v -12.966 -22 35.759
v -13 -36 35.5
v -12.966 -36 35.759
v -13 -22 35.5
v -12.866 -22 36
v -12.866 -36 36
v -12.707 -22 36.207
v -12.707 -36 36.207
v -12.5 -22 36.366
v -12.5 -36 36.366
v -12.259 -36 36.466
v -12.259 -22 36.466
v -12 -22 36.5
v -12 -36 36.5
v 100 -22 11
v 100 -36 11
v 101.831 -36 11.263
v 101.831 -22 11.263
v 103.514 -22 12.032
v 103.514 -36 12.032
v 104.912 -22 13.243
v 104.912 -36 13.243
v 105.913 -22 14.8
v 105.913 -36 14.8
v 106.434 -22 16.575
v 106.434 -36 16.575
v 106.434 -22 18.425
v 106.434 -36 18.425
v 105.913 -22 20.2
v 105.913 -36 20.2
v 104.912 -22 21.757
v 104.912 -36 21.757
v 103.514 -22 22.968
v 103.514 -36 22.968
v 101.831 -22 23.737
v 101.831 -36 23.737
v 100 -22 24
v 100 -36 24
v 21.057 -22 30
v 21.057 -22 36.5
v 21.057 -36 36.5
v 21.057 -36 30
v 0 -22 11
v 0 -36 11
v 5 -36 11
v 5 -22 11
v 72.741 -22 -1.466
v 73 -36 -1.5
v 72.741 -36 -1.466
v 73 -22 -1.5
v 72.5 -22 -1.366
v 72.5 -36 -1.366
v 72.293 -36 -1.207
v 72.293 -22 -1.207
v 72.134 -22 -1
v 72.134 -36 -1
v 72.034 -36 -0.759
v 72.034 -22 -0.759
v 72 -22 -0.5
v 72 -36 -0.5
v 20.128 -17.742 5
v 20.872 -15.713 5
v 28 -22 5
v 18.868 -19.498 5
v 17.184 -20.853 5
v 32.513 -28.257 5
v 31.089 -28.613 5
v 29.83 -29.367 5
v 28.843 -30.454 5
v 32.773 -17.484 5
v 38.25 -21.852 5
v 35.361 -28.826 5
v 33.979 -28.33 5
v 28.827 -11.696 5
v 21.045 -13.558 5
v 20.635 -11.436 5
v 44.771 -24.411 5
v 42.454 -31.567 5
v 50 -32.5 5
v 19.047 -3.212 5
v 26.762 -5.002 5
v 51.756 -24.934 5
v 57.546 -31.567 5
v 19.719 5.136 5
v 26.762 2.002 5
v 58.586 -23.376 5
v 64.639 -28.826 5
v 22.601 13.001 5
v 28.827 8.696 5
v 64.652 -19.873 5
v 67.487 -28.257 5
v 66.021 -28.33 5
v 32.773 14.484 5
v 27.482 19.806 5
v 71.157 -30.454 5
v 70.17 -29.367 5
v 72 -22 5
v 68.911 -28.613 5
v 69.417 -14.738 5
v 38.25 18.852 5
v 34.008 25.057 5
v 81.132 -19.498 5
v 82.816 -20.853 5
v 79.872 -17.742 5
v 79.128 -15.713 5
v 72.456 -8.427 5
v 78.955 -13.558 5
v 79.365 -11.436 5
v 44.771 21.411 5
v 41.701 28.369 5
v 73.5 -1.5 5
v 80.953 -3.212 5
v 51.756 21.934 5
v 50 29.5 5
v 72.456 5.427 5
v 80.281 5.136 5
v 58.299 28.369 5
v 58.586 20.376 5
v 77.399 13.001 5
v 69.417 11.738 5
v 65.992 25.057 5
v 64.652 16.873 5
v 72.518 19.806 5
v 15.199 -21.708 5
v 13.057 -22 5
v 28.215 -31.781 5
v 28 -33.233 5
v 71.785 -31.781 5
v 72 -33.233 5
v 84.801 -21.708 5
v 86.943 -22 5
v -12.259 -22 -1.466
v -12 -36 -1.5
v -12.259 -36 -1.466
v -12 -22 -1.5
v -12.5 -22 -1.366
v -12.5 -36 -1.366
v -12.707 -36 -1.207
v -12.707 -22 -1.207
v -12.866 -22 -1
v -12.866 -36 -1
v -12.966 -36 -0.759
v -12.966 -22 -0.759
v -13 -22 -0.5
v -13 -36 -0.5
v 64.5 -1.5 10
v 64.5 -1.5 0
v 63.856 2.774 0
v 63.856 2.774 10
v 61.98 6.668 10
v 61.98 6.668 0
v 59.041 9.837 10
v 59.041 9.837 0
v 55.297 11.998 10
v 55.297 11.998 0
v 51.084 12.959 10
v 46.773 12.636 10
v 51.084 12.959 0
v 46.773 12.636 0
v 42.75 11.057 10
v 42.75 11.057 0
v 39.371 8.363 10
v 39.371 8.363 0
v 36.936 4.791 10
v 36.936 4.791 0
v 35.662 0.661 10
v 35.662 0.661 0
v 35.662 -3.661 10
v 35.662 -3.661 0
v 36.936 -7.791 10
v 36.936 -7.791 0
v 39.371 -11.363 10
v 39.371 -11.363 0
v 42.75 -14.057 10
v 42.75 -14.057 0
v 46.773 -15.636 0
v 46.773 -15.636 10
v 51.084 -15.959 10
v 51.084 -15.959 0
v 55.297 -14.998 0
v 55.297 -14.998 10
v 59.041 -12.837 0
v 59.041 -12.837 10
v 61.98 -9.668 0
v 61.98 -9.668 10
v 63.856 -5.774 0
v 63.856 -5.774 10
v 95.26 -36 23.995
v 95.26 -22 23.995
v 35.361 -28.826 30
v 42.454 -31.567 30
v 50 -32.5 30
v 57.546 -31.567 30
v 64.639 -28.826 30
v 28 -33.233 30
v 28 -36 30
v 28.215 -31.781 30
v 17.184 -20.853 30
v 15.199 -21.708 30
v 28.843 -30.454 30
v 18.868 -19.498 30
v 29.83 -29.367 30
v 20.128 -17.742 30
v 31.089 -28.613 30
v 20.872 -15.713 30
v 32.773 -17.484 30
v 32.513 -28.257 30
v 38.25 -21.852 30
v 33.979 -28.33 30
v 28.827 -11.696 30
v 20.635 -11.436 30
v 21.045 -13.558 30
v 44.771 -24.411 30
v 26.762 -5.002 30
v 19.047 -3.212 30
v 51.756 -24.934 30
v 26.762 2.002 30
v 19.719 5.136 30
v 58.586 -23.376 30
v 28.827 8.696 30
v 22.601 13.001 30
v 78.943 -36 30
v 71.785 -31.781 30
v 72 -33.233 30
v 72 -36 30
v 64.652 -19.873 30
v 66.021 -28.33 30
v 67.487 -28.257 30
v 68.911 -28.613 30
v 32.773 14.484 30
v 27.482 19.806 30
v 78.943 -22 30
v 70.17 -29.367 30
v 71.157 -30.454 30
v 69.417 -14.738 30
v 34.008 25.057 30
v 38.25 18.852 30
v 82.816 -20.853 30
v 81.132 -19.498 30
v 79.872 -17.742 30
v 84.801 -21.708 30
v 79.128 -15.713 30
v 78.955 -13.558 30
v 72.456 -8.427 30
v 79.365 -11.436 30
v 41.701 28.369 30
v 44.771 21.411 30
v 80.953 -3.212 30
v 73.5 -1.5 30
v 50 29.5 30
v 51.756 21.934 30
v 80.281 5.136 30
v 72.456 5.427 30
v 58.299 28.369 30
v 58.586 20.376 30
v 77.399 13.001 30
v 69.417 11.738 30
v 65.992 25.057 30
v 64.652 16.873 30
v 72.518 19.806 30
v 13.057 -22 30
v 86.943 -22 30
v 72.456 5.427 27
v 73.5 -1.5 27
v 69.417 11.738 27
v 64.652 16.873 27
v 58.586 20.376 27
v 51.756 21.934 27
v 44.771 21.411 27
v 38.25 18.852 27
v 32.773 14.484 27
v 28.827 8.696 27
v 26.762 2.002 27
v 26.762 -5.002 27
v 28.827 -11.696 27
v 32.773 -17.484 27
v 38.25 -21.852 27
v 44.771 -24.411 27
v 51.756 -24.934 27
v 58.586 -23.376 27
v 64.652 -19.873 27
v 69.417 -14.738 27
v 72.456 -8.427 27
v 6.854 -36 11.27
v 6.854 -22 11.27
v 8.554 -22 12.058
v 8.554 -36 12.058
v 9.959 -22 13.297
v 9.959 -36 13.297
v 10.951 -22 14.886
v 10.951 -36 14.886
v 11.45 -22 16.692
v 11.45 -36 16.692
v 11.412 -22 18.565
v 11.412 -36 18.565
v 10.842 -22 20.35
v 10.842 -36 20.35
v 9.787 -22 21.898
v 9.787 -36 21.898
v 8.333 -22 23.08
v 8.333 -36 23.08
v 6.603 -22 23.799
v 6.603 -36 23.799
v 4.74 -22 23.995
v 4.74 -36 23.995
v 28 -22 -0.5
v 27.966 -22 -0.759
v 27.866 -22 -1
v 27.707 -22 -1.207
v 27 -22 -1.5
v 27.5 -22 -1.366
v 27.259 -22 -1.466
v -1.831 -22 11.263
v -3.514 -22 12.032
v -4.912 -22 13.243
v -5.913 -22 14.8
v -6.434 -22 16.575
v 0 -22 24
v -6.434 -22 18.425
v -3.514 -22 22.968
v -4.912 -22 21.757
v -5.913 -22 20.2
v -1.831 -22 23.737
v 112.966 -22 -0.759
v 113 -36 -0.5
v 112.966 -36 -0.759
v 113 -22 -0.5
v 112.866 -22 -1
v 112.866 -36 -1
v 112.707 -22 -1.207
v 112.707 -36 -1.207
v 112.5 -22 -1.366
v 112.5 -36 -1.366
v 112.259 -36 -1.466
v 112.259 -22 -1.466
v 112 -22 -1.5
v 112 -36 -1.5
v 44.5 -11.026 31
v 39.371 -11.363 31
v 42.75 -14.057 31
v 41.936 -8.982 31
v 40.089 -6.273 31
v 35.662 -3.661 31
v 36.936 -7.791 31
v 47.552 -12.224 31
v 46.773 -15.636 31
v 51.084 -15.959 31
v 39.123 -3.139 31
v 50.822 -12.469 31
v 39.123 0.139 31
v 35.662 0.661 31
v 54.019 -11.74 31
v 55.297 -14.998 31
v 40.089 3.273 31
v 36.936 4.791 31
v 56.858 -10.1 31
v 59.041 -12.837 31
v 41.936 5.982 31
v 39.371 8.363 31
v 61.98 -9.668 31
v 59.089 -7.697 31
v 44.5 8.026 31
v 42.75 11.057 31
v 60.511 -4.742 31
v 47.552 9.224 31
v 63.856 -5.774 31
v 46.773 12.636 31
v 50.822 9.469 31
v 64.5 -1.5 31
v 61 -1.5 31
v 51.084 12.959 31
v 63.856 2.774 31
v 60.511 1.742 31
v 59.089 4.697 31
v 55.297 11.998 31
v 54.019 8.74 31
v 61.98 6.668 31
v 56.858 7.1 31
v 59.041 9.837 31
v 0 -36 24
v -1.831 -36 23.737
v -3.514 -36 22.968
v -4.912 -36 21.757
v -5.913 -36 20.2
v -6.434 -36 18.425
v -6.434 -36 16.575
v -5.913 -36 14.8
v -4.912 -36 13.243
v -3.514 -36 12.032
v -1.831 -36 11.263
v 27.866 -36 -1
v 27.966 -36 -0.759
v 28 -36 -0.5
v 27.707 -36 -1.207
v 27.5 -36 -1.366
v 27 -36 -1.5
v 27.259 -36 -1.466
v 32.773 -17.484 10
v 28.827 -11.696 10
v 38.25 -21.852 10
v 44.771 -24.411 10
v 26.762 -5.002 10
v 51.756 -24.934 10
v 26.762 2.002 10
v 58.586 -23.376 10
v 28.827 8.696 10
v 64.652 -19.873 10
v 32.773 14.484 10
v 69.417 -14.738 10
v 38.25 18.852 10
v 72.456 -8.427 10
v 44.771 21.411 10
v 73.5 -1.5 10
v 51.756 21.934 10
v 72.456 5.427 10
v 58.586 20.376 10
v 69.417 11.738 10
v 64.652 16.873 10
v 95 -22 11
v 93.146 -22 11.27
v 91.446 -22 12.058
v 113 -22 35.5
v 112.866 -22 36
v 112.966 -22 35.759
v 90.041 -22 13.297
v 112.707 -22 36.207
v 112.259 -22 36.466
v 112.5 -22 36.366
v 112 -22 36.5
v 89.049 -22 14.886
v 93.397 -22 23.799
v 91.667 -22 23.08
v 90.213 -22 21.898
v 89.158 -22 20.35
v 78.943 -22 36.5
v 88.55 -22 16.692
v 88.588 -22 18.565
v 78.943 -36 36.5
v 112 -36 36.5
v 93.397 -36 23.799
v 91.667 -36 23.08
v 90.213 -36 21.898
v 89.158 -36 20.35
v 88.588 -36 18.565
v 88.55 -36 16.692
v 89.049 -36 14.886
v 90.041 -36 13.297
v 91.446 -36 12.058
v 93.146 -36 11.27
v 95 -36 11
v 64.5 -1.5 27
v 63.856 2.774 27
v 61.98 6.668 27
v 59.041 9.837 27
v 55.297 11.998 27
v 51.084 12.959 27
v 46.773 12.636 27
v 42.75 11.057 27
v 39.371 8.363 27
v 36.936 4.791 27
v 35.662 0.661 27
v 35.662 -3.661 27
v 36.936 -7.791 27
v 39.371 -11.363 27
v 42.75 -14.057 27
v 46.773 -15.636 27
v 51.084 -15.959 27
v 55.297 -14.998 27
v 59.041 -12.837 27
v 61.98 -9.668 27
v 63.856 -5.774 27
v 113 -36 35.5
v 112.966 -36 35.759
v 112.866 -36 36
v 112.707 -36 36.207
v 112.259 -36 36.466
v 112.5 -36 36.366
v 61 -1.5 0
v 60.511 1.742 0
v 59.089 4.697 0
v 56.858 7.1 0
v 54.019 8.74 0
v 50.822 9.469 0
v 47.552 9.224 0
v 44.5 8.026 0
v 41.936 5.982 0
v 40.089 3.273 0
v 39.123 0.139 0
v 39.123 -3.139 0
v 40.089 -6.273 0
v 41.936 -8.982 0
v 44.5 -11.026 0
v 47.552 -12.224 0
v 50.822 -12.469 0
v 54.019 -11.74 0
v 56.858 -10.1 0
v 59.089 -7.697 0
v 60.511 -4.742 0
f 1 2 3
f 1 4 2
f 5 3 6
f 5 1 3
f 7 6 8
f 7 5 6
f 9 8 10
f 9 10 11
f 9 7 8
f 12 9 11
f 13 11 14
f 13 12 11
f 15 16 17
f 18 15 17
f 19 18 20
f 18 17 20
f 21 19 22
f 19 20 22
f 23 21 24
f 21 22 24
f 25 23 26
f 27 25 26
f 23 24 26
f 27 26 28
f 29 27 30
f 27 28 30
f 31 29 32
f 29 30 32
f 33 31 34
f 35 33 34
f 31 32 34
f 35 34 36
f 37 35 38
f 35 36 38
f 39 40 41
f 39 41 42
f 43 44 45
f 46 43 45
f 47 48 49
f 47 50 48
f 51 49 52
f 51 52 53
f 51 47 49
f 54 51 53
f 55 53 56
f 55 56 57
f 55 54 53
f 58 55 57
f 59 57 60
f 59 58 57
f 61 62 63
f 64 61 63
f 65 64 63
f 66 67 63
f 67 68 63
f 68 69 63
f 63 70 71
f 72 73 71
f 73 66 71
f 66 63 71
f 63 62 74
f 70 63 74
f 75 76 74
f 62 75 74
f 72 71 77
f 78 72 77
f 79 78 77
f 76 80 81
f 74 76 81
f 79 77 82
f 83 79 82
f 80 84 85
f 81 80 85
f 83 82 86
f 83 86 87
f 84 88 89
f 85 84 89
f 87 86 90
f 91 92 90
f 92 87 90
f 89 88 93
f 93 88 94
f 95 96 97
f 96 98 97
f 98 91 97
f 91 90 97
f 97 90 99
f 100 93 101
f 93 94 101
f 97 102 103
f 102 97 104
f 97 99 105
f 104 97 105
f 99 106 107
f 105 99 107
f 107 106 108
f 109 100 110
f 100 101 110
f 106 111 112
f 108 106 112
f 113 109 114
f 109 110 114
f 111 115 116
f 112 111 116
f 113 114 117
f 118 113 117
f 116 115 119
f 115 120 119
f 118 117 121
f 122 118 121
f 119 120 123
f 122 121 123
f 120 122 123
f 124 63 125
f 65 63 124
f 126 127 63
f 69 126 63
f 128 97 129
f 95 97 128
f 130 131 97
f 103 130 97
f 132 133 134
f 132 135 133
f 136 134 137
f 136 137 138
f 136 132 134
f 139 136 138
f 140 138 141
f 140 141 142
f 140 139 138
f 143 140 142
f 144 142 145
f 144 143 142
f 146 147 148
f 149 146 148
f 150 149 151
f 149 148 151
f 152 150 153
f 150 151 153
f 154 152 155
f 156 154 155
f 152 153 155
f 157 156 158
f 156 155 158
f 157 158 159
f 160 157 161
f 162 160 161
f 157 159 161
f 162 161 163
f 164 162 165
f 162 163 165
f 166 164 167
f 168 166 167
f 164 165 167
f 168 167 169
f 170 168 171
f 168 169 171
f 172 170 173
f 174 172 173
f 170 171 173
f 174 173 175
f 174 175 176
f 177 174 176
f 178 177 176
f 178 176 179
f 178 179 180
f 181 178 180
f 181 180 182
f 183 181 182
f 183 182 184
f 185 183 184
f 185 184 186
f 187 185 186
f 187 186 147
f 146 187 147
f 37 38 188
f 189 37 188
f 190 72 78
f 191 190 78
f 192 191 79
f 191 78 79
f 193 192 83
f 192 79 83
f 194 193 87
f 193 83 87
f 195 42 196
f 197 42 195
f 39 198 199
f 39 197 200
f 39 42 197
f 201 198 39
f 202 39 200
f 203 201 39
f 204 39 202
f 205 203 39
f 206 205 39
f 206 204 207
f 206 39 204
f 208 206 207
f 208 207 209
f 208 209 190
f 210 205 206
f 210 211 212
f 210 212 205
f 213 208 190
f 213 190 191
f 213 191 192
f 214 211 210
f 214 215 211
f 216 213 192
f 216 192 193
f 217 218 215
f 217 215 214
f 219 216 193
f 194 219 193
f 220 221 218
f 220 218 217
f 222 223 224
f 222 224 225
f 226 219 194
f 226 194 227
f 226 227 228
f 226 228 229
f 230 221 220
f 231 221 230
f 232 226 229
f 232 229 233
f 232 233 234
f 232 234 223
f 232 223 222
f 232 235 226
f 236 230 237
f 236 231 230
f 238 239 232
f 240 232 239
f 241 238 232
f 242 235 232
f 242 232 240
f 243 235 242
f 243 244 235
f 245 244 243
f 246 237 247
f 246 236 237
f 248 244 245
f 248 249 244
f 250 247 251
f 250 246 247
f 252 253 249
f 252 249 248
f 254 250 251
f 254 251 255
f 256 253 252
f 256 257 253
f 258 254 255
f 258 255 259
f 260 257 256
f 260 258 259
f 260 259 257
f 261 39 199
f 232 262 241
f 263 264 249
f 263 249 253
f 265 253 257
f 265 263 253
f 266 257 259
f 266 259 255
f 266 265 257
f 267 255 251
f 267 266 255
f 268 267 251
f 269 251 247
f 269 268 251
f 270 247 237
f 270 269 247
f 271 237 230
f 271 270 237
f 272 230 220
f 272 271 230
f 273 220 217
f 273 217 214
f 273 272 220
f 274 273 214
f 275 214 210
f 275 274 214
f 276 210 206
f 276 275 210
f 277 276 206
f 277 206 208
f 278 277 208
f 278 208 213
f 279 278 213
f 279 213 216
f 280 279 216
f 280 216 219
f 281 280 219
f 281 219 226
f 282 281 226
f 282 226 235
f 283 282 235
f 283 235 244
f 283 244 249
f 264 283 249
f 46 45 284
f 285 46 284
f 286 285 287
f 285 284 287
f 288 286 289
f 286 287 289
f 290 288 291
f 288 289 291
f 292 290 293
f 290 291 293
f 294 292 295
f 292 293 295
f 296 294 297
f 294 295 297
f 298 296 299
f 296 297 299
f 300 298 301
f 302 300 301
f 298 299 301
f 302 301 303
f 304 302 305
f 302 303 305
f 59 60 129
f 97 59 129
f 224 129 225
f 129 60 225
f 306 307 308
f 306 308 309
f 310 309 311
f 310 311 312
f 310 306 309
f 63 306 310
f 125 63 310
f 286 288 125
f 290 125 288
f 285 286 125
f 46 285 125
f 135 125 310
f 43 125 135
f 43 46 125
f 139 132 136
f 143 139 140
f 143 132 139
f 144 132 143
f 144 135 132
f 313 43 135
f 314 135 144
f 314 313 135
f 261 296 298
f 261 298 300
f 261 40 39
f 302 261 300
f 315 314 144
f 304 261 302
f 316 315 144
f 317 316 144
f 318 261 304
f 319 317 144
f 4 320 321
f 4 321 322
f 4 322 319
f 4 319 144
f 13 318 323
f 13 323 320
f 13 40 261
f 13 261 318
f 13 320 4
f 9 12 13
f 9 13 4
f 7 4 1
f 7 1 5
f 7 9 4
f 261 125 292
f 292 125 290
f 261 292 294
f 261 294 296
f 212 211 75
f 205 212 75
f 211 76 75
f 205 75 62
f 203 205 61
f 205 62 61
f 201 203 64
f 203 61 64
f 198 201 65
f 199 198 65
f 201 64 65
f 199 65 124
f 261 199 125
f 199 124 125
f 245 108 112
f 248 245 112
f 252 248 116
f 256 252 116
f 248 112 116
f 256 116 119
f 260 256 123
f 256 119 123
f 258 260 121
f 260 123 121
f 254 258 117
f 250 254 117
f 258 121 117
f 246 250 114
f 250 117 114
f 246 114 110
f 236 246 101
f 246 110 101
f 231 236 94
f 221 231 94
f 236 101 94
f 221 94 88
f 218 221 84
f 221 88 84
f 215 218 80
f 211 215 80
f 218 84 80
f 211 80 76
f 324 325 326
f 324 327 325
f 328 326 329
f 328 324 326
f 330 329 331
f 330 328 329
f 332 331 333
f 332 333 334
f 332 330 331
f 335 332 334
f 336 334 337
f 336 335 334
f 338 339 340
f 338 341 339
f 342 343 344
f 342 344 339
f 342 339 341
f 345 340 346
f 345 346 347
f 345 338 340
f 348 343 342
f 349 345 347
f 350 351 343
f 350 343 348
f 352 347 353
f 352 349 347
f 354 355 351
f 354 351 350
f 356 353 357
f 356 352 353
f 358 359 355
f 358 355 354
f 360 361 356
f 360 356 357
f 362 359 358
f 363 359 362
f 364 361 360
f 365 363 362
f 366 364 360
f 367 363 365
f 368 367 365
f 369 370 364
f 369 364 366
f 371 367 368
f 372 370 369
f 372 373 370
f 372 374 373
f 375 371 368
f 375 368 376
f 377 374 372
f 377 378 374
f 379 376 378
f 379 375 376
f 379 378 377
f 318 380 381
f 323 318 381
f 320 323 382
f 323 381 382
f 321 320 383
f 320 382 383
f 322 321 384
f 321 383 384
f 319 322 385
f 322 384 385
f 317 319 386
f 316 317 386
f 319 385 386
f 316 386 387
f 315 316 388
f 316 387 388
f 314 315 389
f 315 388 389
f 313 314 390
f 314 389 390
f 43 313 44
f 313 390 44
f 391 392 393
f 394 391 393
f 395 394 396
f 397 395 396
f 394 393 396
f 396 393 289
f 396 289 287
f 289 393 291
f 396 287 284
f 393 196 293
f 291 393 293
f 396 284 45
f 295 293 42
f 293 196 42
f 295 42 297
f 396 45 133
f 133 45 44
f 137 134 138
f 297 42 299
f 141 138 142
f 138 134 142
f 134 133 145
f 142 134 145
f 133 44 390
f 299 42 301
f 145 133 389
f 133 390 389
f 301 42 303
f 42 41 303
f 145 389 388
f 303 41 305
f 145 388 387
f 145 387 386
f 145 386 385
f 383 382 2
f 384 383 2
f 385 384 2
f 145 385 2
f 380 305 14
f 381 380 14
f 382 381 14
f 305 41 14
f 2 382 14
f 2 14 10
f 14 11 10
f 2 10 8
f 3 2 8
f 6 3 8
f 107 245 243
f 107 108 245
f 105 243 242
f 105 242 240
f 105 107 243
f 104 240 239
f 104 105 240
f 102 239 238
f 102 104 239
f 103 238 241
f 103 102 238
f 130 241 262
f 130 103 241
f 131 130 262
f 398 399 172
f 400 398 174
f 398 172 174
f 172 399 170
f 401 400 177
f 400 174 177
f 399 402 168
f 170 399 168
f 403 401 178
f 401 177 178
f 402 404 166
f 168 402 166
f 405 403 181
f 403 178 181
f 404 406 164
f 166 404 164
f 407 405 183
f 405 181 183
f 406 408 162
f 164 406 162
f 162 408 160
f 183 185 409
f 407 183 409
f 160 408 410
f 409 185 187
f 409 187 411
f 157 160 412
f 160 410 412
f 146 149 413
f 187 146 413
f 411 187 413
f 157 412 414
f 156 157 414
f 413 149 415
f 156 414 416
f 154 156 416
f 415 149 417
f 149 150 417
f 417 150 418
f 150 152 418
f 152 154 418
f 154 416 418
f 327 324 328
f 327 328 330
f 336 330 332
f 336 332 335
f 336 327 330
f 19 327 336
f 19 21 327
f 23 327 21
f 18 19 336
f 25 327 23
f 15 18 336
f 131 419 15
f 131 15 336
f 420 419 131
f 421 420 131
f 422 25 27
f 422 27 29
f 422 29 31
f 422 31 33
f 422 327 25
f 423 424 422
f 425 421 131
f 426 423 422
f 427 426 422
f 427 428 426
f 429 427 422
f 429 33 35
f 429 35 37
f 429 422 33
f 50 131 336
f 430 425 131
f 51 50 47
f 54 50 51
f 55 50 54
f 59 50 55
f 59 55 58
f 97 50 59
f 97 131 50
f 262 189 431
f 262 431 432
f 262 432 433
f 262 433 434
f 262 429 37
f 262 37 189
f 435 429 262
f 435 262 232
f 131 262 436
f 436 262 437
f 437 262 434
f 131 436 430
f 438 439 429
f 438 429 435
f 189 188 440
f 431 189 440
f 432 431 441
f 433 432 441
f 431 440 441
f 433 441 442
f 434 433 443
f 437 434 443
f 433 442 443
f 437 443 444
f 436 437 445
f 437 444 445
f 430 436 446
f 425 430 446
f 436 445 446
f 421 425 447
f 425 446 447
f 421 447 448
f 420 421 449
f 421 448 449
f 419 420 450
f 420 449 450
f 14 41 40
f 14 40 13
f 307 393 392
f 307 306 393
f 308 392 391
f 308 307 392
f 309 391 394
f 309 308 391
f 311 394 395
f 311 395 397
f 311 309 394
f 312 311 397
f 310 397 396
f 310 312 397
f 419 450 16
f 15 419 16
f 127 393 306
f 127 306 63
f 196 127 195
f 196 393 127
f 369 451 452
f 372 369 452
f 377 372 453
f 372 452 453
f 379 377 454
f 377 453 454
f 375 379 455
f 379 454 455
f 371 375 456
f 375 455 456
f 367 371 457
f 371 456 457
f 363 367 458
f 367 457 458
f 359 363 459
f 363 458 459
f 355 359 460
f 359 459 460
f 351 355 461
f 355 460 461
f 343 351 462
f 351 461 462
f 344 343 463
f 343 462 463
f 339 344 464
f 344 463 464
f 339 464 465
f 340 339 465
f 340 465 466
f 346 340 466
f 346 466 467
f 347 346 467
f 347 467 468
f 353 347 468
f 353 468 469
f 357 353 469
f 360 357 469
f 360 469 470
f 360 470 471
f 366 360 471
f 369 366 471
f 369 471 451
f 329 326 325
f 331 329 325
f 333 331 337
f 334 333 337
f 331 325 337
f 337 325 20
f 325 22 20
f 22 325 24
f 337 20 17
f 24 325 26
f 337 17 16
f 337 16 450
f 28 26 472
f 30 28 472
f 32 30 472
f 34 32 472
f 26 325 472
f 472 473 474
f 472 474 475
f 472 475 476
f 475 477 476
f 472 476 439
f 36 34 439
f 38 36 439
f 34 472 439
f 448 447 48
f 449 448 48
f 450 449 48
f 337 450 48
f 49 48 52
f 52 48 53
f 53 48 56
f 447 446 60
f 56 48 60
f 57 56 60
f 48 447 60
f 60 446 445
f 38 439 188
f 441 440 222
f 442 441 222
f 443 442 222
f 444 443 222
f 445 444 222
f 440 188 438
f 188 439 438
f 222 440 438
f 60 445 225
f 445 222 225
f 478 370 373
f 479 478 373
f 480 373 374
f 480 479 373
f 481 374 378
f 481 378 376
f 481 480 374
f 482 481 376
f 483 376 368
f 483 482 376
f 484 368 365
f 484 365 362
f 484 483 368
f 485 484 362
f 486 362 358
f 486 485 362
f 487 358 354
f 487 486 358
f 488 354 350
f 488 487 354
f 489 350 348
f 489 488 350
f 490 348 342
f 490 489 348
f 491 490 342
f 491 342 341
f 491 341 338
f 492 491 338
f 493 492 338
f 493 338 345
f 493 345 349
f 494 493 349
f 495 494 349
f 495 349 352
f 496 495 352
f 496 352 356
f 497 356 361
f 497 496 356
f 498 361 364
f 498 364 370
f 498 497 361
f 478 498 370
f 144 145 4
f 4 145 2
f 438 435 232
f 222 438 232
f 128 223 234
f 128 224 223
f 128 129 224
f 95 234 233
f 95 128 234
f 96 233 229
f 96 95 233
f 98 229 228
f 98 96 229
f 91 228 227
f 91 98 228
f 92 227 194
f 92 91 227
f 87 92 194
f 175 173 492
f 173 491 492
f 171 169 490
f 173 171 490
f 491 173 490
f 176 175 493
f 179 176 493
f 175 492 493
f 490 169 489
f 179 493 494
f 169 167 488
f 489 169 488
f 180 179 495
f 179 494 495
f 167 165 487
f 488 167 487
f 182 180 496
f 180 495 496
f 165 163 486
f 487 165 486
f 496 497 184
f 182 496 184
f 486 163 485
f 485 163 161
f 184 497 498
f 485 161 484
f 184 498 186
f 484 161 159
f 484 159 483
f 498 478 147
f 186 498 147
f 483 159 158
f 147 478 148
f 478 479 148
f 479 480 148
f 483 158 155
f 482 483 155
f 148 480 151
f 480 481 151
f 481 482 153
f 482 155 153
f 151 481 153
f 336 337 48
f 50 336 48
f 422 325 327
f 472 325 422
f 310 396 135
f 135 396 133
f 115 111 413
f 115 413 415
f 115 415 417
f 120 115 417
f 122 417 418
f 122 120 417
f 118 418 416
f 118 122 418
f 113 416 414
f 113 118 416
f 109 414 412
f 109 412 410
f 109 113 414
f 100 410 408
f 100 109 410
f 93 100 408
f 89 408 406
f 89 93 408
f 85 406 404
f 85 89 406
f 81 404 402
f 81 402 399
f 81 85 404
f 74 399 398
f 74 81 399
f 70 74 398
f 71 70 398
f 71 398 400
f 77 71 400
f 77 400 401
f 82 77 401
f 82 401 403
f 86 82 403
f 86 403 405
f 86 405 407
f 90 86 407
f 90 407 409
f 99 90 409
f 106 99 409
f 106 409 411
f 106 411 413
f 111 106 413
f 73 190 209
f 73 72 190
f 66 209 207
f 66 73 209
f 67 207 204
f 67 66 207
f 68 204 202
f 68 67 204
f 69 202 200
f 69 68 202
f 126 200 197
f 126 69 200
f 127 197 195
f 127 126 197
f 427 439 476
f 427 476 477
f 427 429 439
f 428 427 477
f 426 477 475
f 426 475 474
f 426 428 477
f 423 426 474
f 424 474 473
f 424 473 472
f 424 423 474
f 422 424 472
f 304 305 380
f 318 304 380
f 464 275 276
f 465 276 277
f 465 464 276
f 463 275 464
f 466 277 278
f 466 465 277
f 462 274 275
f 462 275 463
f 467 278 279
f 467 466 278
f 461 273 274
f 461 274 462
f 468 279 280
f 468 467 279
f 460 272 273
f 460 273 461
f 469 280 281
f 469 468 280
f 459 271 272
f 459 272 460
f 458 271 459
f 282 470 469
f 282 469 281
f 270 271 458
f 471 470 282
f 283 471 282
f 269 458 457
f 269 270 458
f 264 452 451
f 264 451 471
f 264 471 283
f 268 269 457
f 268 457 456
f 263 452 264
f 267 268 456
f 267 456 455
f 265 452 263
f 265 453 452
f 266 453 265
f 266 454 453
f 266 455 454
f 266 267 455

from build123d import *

# Parameters (mm, degrees)
SKETCH_8_R          = 14.5
SKETCH_8_R_2        = 11
EXTRUDE_1_DEPTH     = 31
SKETCH_10_R         = 23.5
SKETCH_10_R_2       = 14.5
EXTRUDE_2_DEPTH     = 17
EXTRUDE_START       = -5
SKETCH_11_R         = 31
SKETCH_11_R_2       = 23.5
EXTRUDE_3_DEPTH     = 25
SKETCH_13_W         = 41
SKETCH_13_H         = 38
EXTRUDE_4_DEPTH     = 14
FILLET_1_R          = 8
FILLET_2_R          = 5
FILLET_3_R          = 5
FILLET_4_R          = 8
FILLET_5_R          = 1
FILLET_6_R          = 1
SKETCH_14_W         = 12.689774382
SKETCH_14_H         = 9.496761799
CUT_EXTRUDE_5_DEPTH = 130.435312029


with BuildPart() as part:
    # Эскиз8 → Вытянуть1 (new body)
    with BuildSketch(Plane.XY):
        with Locations((50, -1.5)):
            Circle(SKETCH_8_R)
        with Locations((50, -1.5)):
            Circle(SKETCH_8_R_2, mode=Mode.SUBTRACT)
    extrude(amount=EXTRUDE_1_DEPTH)

    # Эскиз10 → Вытянуть2 (add)
    with BuildSketch(Plane.XY.offset(10)):
        with Locations((50, -1.5)):
            Circle(SKETCH_10_R)
        with Locations((50, -1.5)):
            Circle(SKETCH_10_R_2, mode=Mode.SUBTRACT)
    extrude(amount=EXTRUDE_2_DEPTH)

    # Эскиз11 → Вытянуть3 (add)
    with BuildSketch(Plane.XY.offset(10).offset(EXTRUDE_START)):
        with Locations((50, -1.5)):
            Circle(SKETCH_11_R)
        with Locations((50, -1.5)):
            Circle(SKETCH_11_R_2, mode=Mode.SUBTRACT)
    extrude(amount=EXTRUDE_3_DEPTH)

    # Эскиз13 → Вытянуть4 (add)
    # profile 1 of 2: a face of its own
    with BuildSketch(Plane(origin=(0, -36, 0), x_dir=(-1, 0, 0), z_dir=(0, 1, 0))):
        with Locations((-7.5, 17.5)):
            Rectangle(SKETCH_13_W, SKETCH_13_H)
        with BuildLine():
            Line((-4.740103958, 23.994802079), (0, 24))
            ThreePointArc((0, 24), (6.5, 17.5), (0, 11))
            Line((0, 11), (-5, 11))
            ThreePointArc((-5, 11), (-11.49870039, 17.629974008), (-4.740103958, 23.994802079))
        make_face(mode=Mode.SUBTRACT)
    # profile 2 of 2: a face of its own
    with BuildSketch(Plane(origin=(0, -36, 0), x_dir=(-1, 0, 0), z_dir=(0, 1, 0))):
        with Locations((-92.5, 17.5)):
            Rectangle(SKETCH_13_W, SKETCH_13_H)
        with BuildLine():
            Line((-95, 11), (-100, 11))
            ThreePointArc((-100, 11), (-106.5, 17.5), (-100, 24))
            Line((-100, 24), (-95.259896042, 23.994802079))
            ThreePointArc((-95.259896042, 23.994802079), (-88.50129961, 17.629974008), (-95, 11))
        make_face(mode=Mode.SUBTRACT)
    extrude(amount=EXTRUDE_4_DEPTH)

    # Скругление1
    fillet_1_edges = [part.edges().sort_by_distance(p)[0] for p in [
        (26.745968092, -22, 17.5),
    ]]
    fillet(fillet_1_edges, radius=FILLET_1_R)

    # Скругление2
    fillet_2_edges = [part.edges().sort_by_distance(p)[0] for p in [
        (28, -23.340329668, 17.5),
    ]]
    fillet(fillet_2_edges, radius=FILLET_2_R)

    # Скругление3
    fillet_3_edges = [part.edges().sort_by_distance(p)[0] for p in [
        (72, -23.340329668, 17.5),
    ]]
    fillet(fillet_3_edges, radius=FILLET_3_R)

    # Скругление4
    fillet_4_edges = [part.edges().sort_by_distance(p)[0] for p in [
        (73.254031908, -22, 17.5),
    ]]
    fillet(fillet_4_edges, radius=FILLET_4_R)

    # Скругление5
    fillet_5_edges = [part.edges().sort_by_distance(p)[0] for p in [
        (28, -29, 36.5),
        (28, -29, -1.5),
        (72, -29, -1.5),
        (72, -29, 36.5),
    ]]
    fillet(fillet_5_edges, radius=FILLET_5_R)

    # Скругление6
    fillet_6_edges = [part.edges().sort_by_distance(p)[0] for p in [
        (-13, -29, -1.5),
        (-13, -29, 36.5),
        (113, -29, 36.5),
        (113, -29, -1.5),
    ]]
    fillet(fillet_6_edges, radius=FILLET_6_R)

    # Эскиз14 → Вытянуть5 (cut, through all)
    with BuildSketch(Plane(origin=(0, -22, 0), x_dir=(1, 0, 0), z_dir=(0, 1, 0))):
        with Locations((27.402364267, -34.7483809)):
            Rectangle(SKETCH_14_W, SKETCH_14_H)
        with Locations((72.597635733, -34.7483809)):
            Rectangle(SKETCH_14_W, SKETCH_14_H)
    extrude(amount=-CUT_EXTRUDE_5_DEPTH, mode=Mode.SUBTRACT)


solid = part.part
